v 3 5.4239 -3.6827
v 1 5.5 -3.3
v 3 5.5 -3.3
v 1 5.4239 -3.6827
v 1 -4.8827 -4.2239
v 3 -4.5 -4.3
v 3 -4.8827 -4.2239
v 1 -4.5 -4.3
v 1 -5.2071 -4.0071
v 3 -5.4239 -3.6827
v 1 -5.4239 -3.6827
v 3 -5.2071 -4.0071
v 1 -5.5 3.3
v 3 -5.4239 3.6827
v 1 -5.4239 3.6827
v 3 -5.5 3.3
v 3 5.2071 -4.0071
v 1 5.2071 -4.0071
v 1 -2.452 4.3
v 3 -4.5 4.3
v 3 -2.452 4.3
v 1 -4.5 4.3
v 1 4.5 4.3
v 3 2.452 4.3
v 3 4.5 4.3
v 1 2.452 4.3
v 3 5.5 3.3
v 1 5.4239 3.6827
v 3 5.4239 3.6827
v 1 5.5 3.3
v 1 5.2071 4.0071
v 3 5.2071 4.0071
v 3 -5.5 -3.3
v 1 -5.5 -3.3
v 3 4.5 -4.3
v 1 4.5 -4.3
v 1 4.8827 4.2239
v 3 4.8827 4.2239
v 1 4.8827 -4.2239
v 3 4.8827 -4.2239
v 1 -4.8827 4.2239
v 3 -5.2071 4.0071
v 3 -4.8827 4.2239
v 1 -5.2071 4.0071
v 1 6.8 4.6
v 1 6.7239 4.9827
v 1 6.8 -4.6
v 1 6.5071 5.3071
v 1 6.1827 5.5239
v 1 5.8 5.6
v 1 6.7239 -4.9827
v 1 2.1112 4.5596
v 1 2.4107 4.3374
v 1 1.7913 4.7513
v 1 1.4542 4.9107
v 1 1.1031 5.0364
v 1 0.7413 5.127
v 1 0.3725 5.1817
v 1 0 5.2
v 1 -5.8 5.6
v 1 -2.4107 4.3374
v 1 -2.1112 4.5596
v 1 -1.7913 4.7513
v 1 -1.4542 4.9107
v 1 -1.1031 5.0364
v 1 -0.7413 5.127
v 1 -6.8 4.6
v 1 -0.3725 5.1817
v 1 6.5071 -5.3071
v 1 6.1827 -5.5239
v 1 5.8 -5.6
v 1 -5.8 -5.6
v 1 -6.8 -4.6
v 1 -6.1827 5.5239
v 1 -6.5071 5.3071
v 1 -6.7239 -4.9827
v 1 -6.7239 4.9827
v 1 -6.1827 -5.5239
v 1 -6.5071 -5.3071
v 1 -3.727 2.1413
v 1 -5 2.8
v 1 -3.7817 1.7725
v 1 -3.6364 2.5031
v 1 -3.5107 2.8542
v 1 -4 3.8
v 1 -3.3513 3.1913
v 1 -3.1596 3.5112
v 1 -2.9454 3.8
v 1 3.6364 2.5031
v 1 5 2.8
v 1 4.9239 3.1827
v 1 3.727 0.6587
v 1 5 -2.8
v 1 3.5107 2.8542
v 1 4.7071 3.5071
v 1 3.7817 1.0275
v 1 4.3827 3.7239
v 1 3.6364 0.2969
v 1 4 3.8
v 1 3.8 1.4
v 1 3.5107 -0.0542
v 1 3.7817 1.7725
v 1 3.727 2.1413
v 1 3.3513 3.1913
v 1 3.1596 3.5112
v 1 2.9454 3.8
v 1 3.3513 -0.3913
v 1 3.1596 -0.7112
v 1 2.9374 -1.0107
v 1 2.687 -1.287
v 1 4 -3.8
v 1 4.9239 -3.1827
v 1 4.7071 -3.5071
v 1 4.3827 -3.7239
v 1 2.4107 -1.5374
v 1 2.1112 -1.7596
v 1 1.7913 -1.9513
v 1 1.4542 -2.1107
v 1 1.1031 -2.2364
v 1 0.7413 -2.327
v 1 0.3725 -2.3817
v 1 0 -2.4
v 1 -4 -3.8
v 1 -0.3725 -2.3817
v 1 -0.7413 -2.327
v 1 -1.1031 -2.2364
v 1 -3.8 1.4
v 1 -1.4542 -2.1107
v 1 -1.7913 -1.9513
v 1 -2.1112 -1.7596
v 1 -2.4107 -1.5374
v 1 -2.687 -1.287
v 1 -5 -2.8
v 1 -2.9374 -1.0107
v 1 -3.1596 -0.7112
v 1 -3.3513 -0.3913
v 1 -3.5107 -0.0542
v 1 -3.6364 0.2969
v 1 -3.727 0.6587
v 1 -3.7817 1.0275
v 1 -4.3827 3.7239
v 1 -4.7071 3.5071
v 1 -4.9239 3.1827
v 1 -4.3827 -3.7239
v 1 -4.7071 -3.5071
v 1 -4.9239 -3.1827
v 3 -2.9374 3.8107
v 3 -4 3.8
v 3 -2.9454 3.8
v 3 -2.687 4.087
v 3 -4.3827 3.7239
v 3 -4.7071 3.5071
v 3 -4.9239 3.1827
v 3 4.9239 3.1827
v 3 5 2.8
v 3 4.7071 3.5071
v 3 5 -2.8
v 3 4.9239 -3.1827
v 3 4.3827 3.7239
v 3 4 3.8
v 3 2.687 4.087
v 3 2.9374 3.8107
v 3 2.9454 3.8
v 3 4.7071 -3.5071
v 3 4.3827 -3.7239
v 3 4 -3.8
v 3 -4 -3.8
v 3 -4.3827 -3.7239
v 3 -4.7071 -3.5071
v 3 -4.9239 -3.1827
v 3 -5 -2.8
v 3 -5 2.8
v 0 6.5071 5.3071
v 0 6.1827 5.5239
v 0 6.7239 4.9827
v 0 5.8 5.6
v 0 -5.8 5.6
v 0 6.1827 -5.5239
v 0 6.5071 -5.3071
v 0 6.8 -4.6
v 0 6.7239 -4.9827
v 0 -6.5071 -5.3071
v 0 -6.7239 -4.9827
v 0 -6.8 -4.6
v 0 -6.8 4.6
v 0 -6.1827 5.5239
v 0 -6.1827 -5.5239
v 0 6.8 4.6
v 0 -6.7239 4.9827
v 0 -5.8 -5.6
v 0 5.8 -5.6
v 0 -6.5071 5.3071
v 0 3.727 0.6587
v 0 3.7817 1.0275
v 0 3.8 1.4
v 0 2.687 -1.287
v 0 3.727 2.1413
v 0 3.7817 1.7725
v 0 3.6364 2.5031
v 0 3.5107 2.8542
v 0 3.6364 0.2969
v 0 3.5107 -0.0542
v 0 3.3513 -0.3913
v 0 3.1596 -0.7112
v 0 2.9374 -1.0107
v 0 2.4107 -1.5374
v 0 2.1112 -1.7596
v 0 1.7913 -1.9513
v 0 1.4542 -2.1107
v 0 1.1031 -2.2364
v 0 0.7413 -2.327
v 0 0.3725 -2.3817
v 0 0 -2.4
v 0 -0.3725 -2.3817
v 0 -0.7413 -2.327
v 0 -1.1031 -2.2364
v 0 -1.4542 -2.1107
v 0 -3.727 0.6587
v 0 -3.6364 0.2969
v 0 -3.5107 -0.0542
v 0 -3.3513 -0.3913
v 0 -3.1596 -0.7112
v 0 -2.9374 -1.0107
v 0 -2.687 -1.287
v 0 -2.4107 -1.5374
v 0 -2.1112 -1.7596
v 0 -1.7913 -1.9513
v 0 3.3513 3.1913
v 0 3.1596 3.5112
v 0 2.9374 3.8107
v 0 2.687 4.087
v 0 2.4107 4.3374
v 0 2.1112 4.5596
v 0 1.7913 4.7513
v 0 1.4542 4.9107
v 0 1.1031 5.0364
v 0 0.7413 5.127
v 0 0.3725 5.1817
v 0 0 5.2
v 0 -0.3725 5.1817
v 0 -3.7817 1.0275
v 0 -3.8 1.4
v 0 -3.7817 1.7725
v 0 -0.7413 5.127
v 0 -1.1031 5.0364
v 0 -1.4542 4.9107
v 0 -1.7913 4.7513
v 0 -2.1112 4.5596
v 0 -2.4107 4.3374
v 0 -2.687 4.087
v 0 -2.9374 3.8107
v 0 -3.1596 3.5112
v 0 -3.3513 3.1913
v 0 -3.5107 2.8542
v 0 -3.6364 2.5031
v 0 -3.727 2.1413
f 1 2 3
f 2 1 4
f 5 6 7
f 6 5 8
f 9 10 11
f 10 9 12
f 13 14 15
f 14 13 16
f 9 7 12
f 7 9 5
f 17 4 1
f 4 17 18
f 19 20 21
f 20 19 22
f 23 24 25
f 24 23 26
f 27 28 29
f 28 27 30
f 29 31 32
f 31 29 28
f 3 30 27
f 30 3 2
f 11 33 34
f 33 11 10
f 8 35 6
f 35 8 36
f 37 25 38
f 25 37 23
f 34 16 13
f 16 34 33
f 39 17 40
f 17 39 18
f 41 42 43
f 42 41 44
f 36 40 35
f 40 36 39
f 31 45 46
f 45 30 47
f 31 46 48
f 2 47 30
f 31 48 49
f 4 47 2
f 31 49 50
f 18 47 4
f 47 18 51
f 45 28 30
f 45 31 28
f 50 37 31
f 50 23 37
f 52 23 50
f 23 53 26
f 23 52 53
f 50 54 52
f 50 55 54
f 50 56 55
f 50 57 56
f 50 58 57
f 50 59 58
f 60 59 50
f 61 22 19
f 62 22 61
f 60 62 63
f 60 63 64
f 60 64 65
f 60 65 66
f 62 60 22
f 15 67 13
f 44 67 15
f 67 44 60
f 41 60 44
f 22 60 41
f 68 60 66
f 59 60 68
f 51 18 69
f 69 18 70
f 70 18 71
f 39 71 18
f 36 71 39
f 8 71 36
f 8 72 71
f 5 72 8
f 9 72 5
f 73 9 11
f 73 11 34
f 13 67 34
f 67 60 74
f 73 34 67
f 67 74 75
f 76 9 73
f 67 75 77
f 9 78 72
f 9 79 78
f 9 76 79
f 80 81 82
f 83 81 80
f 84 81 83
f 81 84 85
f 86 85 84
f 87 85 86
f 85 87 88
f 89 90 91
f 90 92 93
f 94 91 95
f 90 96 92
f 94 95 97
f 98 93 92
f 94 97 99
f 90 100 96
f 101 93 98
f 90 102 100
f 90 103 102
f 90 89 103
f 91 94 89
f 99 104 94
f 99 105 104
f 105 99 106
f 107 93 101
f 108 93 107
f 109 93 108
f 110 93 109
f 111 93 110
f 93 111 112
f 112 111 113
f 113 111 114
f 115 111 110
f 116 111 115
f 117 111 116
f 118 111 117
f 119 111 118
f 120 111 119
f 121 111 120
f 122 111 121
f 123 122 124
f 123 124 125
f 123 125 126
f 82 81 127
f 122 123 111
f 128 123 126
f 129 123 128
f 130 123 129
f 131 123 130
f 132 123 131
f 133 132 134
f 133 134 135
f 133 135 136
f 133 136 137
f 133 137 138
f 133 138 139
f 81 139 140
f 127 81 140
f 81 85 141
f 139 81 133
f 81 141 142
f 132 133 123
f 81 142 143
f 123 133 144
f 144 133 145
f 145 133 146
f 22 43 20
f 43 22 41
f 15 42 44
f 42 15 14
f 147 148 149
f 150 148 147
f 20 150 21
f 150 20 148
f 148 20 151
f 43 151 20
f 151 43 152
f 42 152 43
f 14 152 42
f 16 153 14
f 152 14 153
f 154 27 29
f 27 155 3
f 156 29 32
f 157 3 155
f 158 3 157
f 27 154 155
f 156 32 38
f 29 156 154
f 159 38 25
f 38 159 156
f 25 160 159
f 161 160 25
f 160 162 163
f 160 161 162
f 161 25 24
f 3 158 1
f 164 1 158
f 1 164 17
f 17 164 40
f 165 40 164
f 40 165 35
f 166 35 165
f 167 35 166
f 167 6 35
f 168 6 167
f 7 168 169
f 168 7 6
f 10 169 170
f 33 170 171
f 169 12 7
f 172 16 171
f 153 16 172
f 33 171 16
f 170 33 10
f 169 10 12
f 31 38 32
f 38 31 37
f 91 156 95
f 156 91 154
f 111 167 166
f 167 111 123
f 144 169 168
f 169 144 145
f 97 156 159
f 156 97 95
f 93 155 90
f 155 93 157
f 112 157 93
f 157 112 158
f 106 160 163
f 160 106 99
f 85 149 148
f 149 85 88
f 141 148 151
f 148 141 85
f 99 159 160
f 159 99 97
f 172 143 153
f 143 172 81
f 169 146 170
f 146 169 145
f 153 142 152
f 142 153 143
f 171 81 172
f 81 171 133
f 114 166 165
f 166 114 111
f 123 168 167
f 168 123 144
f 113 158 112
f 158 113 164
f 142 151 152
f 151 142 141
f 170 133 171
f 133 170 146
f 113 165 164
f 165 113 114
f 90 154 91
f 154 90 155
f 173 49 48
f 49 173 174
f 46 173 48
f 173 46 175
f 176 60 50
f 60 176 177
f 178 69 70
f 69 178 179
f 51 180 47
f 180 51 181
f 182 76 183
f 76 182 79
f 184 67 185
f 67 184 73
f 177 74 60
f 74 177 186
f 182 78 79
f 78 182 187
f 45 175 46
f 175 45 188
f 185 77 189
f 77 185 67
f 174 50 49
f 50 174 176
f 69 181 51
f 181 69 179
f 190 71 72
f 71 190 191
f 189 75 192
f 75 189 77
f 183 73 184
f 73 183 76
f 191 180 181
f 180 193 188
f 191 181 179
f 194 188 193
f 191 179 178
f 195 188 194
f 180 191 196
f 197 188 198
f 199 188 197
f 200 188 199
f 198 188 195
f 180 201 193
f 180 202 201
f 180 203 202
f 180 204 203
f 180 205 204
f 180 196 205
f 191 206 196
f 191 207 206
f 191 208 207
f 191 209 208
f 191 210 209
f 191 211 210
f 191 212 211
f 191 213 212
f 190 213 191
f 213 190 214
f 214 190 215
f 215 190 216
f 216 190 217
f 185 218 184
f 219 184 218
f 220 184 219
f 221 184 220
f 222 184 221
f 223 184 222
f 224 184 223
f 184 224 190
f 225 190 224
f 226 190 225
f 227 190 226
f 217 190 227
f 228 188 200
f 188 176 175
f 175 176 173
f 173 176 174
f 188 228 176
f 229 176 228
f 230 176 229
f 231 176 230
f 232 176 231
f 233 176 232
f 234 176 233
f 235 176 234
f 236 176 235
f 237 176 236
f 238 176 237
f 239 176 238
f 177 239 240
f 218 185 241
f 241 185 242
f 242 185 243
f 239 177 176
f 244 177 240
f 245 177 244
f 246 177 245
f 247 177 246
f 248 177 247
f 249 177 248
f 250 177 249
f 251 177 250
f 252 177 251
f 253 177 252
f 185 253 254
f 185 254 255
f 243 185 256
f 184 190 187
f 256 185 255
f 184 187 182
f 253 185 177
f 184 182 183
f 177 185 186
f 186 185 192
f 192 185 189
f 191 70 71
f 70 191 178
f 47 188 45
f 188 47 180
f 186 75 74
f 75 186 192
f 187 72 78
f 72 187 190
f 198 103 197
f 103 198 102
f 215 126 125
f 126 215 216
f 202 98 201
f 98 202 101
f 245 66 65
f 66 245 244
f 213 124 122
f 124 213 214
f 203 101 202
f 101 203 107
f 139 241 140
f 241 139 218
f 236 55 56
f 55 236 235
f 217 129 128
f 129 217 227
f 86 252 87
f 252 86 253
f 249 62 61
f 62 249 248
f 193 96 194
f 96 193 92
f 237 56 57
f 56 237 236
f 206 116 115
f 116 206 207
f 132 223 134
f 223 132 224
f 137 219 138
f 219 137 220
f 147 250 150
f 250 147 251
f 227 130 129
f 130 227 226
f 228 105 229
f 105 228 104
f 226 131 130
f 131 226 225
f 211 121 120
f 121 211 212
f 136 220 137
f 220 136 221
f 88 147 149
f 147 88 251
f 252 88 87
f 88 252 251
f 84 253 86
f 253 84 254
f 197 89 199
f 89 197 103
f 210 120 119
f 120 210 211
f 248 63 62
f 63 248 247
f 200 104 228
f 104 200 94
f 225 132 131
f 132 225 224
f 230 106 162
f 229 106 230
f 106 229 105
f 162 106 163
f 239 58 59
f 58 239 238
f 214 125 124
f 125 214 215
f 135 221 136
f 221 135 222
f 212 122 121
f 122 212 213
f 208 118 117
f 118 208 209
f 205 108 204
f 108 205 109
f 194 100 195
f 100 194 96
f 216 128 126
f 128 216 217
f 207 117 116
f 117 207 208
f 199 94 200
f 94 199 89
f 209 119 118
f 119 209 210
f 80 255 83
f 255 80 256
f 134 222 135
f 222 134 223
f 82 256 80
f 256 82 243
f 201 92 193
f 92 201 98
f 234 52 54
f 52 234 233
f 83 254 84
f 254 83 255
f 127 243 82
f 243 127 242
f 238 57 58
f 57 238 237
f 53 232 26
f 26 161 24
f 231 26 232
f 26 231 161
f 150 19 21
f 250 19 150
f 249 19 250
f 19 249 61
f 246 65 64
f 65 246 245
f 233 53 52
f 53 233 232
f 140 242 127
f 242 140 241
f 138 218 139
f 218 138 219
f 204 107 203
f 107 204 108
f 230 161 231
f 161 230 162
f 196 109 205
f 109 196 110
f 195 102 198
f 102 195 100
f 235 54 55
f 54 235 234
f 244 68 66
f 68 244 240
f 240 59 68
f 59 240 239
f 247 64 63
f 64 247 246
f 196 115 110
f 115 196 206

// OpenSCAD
use <../audiojack.scad>
audiojack_unit_lid_only(with_print=1);
